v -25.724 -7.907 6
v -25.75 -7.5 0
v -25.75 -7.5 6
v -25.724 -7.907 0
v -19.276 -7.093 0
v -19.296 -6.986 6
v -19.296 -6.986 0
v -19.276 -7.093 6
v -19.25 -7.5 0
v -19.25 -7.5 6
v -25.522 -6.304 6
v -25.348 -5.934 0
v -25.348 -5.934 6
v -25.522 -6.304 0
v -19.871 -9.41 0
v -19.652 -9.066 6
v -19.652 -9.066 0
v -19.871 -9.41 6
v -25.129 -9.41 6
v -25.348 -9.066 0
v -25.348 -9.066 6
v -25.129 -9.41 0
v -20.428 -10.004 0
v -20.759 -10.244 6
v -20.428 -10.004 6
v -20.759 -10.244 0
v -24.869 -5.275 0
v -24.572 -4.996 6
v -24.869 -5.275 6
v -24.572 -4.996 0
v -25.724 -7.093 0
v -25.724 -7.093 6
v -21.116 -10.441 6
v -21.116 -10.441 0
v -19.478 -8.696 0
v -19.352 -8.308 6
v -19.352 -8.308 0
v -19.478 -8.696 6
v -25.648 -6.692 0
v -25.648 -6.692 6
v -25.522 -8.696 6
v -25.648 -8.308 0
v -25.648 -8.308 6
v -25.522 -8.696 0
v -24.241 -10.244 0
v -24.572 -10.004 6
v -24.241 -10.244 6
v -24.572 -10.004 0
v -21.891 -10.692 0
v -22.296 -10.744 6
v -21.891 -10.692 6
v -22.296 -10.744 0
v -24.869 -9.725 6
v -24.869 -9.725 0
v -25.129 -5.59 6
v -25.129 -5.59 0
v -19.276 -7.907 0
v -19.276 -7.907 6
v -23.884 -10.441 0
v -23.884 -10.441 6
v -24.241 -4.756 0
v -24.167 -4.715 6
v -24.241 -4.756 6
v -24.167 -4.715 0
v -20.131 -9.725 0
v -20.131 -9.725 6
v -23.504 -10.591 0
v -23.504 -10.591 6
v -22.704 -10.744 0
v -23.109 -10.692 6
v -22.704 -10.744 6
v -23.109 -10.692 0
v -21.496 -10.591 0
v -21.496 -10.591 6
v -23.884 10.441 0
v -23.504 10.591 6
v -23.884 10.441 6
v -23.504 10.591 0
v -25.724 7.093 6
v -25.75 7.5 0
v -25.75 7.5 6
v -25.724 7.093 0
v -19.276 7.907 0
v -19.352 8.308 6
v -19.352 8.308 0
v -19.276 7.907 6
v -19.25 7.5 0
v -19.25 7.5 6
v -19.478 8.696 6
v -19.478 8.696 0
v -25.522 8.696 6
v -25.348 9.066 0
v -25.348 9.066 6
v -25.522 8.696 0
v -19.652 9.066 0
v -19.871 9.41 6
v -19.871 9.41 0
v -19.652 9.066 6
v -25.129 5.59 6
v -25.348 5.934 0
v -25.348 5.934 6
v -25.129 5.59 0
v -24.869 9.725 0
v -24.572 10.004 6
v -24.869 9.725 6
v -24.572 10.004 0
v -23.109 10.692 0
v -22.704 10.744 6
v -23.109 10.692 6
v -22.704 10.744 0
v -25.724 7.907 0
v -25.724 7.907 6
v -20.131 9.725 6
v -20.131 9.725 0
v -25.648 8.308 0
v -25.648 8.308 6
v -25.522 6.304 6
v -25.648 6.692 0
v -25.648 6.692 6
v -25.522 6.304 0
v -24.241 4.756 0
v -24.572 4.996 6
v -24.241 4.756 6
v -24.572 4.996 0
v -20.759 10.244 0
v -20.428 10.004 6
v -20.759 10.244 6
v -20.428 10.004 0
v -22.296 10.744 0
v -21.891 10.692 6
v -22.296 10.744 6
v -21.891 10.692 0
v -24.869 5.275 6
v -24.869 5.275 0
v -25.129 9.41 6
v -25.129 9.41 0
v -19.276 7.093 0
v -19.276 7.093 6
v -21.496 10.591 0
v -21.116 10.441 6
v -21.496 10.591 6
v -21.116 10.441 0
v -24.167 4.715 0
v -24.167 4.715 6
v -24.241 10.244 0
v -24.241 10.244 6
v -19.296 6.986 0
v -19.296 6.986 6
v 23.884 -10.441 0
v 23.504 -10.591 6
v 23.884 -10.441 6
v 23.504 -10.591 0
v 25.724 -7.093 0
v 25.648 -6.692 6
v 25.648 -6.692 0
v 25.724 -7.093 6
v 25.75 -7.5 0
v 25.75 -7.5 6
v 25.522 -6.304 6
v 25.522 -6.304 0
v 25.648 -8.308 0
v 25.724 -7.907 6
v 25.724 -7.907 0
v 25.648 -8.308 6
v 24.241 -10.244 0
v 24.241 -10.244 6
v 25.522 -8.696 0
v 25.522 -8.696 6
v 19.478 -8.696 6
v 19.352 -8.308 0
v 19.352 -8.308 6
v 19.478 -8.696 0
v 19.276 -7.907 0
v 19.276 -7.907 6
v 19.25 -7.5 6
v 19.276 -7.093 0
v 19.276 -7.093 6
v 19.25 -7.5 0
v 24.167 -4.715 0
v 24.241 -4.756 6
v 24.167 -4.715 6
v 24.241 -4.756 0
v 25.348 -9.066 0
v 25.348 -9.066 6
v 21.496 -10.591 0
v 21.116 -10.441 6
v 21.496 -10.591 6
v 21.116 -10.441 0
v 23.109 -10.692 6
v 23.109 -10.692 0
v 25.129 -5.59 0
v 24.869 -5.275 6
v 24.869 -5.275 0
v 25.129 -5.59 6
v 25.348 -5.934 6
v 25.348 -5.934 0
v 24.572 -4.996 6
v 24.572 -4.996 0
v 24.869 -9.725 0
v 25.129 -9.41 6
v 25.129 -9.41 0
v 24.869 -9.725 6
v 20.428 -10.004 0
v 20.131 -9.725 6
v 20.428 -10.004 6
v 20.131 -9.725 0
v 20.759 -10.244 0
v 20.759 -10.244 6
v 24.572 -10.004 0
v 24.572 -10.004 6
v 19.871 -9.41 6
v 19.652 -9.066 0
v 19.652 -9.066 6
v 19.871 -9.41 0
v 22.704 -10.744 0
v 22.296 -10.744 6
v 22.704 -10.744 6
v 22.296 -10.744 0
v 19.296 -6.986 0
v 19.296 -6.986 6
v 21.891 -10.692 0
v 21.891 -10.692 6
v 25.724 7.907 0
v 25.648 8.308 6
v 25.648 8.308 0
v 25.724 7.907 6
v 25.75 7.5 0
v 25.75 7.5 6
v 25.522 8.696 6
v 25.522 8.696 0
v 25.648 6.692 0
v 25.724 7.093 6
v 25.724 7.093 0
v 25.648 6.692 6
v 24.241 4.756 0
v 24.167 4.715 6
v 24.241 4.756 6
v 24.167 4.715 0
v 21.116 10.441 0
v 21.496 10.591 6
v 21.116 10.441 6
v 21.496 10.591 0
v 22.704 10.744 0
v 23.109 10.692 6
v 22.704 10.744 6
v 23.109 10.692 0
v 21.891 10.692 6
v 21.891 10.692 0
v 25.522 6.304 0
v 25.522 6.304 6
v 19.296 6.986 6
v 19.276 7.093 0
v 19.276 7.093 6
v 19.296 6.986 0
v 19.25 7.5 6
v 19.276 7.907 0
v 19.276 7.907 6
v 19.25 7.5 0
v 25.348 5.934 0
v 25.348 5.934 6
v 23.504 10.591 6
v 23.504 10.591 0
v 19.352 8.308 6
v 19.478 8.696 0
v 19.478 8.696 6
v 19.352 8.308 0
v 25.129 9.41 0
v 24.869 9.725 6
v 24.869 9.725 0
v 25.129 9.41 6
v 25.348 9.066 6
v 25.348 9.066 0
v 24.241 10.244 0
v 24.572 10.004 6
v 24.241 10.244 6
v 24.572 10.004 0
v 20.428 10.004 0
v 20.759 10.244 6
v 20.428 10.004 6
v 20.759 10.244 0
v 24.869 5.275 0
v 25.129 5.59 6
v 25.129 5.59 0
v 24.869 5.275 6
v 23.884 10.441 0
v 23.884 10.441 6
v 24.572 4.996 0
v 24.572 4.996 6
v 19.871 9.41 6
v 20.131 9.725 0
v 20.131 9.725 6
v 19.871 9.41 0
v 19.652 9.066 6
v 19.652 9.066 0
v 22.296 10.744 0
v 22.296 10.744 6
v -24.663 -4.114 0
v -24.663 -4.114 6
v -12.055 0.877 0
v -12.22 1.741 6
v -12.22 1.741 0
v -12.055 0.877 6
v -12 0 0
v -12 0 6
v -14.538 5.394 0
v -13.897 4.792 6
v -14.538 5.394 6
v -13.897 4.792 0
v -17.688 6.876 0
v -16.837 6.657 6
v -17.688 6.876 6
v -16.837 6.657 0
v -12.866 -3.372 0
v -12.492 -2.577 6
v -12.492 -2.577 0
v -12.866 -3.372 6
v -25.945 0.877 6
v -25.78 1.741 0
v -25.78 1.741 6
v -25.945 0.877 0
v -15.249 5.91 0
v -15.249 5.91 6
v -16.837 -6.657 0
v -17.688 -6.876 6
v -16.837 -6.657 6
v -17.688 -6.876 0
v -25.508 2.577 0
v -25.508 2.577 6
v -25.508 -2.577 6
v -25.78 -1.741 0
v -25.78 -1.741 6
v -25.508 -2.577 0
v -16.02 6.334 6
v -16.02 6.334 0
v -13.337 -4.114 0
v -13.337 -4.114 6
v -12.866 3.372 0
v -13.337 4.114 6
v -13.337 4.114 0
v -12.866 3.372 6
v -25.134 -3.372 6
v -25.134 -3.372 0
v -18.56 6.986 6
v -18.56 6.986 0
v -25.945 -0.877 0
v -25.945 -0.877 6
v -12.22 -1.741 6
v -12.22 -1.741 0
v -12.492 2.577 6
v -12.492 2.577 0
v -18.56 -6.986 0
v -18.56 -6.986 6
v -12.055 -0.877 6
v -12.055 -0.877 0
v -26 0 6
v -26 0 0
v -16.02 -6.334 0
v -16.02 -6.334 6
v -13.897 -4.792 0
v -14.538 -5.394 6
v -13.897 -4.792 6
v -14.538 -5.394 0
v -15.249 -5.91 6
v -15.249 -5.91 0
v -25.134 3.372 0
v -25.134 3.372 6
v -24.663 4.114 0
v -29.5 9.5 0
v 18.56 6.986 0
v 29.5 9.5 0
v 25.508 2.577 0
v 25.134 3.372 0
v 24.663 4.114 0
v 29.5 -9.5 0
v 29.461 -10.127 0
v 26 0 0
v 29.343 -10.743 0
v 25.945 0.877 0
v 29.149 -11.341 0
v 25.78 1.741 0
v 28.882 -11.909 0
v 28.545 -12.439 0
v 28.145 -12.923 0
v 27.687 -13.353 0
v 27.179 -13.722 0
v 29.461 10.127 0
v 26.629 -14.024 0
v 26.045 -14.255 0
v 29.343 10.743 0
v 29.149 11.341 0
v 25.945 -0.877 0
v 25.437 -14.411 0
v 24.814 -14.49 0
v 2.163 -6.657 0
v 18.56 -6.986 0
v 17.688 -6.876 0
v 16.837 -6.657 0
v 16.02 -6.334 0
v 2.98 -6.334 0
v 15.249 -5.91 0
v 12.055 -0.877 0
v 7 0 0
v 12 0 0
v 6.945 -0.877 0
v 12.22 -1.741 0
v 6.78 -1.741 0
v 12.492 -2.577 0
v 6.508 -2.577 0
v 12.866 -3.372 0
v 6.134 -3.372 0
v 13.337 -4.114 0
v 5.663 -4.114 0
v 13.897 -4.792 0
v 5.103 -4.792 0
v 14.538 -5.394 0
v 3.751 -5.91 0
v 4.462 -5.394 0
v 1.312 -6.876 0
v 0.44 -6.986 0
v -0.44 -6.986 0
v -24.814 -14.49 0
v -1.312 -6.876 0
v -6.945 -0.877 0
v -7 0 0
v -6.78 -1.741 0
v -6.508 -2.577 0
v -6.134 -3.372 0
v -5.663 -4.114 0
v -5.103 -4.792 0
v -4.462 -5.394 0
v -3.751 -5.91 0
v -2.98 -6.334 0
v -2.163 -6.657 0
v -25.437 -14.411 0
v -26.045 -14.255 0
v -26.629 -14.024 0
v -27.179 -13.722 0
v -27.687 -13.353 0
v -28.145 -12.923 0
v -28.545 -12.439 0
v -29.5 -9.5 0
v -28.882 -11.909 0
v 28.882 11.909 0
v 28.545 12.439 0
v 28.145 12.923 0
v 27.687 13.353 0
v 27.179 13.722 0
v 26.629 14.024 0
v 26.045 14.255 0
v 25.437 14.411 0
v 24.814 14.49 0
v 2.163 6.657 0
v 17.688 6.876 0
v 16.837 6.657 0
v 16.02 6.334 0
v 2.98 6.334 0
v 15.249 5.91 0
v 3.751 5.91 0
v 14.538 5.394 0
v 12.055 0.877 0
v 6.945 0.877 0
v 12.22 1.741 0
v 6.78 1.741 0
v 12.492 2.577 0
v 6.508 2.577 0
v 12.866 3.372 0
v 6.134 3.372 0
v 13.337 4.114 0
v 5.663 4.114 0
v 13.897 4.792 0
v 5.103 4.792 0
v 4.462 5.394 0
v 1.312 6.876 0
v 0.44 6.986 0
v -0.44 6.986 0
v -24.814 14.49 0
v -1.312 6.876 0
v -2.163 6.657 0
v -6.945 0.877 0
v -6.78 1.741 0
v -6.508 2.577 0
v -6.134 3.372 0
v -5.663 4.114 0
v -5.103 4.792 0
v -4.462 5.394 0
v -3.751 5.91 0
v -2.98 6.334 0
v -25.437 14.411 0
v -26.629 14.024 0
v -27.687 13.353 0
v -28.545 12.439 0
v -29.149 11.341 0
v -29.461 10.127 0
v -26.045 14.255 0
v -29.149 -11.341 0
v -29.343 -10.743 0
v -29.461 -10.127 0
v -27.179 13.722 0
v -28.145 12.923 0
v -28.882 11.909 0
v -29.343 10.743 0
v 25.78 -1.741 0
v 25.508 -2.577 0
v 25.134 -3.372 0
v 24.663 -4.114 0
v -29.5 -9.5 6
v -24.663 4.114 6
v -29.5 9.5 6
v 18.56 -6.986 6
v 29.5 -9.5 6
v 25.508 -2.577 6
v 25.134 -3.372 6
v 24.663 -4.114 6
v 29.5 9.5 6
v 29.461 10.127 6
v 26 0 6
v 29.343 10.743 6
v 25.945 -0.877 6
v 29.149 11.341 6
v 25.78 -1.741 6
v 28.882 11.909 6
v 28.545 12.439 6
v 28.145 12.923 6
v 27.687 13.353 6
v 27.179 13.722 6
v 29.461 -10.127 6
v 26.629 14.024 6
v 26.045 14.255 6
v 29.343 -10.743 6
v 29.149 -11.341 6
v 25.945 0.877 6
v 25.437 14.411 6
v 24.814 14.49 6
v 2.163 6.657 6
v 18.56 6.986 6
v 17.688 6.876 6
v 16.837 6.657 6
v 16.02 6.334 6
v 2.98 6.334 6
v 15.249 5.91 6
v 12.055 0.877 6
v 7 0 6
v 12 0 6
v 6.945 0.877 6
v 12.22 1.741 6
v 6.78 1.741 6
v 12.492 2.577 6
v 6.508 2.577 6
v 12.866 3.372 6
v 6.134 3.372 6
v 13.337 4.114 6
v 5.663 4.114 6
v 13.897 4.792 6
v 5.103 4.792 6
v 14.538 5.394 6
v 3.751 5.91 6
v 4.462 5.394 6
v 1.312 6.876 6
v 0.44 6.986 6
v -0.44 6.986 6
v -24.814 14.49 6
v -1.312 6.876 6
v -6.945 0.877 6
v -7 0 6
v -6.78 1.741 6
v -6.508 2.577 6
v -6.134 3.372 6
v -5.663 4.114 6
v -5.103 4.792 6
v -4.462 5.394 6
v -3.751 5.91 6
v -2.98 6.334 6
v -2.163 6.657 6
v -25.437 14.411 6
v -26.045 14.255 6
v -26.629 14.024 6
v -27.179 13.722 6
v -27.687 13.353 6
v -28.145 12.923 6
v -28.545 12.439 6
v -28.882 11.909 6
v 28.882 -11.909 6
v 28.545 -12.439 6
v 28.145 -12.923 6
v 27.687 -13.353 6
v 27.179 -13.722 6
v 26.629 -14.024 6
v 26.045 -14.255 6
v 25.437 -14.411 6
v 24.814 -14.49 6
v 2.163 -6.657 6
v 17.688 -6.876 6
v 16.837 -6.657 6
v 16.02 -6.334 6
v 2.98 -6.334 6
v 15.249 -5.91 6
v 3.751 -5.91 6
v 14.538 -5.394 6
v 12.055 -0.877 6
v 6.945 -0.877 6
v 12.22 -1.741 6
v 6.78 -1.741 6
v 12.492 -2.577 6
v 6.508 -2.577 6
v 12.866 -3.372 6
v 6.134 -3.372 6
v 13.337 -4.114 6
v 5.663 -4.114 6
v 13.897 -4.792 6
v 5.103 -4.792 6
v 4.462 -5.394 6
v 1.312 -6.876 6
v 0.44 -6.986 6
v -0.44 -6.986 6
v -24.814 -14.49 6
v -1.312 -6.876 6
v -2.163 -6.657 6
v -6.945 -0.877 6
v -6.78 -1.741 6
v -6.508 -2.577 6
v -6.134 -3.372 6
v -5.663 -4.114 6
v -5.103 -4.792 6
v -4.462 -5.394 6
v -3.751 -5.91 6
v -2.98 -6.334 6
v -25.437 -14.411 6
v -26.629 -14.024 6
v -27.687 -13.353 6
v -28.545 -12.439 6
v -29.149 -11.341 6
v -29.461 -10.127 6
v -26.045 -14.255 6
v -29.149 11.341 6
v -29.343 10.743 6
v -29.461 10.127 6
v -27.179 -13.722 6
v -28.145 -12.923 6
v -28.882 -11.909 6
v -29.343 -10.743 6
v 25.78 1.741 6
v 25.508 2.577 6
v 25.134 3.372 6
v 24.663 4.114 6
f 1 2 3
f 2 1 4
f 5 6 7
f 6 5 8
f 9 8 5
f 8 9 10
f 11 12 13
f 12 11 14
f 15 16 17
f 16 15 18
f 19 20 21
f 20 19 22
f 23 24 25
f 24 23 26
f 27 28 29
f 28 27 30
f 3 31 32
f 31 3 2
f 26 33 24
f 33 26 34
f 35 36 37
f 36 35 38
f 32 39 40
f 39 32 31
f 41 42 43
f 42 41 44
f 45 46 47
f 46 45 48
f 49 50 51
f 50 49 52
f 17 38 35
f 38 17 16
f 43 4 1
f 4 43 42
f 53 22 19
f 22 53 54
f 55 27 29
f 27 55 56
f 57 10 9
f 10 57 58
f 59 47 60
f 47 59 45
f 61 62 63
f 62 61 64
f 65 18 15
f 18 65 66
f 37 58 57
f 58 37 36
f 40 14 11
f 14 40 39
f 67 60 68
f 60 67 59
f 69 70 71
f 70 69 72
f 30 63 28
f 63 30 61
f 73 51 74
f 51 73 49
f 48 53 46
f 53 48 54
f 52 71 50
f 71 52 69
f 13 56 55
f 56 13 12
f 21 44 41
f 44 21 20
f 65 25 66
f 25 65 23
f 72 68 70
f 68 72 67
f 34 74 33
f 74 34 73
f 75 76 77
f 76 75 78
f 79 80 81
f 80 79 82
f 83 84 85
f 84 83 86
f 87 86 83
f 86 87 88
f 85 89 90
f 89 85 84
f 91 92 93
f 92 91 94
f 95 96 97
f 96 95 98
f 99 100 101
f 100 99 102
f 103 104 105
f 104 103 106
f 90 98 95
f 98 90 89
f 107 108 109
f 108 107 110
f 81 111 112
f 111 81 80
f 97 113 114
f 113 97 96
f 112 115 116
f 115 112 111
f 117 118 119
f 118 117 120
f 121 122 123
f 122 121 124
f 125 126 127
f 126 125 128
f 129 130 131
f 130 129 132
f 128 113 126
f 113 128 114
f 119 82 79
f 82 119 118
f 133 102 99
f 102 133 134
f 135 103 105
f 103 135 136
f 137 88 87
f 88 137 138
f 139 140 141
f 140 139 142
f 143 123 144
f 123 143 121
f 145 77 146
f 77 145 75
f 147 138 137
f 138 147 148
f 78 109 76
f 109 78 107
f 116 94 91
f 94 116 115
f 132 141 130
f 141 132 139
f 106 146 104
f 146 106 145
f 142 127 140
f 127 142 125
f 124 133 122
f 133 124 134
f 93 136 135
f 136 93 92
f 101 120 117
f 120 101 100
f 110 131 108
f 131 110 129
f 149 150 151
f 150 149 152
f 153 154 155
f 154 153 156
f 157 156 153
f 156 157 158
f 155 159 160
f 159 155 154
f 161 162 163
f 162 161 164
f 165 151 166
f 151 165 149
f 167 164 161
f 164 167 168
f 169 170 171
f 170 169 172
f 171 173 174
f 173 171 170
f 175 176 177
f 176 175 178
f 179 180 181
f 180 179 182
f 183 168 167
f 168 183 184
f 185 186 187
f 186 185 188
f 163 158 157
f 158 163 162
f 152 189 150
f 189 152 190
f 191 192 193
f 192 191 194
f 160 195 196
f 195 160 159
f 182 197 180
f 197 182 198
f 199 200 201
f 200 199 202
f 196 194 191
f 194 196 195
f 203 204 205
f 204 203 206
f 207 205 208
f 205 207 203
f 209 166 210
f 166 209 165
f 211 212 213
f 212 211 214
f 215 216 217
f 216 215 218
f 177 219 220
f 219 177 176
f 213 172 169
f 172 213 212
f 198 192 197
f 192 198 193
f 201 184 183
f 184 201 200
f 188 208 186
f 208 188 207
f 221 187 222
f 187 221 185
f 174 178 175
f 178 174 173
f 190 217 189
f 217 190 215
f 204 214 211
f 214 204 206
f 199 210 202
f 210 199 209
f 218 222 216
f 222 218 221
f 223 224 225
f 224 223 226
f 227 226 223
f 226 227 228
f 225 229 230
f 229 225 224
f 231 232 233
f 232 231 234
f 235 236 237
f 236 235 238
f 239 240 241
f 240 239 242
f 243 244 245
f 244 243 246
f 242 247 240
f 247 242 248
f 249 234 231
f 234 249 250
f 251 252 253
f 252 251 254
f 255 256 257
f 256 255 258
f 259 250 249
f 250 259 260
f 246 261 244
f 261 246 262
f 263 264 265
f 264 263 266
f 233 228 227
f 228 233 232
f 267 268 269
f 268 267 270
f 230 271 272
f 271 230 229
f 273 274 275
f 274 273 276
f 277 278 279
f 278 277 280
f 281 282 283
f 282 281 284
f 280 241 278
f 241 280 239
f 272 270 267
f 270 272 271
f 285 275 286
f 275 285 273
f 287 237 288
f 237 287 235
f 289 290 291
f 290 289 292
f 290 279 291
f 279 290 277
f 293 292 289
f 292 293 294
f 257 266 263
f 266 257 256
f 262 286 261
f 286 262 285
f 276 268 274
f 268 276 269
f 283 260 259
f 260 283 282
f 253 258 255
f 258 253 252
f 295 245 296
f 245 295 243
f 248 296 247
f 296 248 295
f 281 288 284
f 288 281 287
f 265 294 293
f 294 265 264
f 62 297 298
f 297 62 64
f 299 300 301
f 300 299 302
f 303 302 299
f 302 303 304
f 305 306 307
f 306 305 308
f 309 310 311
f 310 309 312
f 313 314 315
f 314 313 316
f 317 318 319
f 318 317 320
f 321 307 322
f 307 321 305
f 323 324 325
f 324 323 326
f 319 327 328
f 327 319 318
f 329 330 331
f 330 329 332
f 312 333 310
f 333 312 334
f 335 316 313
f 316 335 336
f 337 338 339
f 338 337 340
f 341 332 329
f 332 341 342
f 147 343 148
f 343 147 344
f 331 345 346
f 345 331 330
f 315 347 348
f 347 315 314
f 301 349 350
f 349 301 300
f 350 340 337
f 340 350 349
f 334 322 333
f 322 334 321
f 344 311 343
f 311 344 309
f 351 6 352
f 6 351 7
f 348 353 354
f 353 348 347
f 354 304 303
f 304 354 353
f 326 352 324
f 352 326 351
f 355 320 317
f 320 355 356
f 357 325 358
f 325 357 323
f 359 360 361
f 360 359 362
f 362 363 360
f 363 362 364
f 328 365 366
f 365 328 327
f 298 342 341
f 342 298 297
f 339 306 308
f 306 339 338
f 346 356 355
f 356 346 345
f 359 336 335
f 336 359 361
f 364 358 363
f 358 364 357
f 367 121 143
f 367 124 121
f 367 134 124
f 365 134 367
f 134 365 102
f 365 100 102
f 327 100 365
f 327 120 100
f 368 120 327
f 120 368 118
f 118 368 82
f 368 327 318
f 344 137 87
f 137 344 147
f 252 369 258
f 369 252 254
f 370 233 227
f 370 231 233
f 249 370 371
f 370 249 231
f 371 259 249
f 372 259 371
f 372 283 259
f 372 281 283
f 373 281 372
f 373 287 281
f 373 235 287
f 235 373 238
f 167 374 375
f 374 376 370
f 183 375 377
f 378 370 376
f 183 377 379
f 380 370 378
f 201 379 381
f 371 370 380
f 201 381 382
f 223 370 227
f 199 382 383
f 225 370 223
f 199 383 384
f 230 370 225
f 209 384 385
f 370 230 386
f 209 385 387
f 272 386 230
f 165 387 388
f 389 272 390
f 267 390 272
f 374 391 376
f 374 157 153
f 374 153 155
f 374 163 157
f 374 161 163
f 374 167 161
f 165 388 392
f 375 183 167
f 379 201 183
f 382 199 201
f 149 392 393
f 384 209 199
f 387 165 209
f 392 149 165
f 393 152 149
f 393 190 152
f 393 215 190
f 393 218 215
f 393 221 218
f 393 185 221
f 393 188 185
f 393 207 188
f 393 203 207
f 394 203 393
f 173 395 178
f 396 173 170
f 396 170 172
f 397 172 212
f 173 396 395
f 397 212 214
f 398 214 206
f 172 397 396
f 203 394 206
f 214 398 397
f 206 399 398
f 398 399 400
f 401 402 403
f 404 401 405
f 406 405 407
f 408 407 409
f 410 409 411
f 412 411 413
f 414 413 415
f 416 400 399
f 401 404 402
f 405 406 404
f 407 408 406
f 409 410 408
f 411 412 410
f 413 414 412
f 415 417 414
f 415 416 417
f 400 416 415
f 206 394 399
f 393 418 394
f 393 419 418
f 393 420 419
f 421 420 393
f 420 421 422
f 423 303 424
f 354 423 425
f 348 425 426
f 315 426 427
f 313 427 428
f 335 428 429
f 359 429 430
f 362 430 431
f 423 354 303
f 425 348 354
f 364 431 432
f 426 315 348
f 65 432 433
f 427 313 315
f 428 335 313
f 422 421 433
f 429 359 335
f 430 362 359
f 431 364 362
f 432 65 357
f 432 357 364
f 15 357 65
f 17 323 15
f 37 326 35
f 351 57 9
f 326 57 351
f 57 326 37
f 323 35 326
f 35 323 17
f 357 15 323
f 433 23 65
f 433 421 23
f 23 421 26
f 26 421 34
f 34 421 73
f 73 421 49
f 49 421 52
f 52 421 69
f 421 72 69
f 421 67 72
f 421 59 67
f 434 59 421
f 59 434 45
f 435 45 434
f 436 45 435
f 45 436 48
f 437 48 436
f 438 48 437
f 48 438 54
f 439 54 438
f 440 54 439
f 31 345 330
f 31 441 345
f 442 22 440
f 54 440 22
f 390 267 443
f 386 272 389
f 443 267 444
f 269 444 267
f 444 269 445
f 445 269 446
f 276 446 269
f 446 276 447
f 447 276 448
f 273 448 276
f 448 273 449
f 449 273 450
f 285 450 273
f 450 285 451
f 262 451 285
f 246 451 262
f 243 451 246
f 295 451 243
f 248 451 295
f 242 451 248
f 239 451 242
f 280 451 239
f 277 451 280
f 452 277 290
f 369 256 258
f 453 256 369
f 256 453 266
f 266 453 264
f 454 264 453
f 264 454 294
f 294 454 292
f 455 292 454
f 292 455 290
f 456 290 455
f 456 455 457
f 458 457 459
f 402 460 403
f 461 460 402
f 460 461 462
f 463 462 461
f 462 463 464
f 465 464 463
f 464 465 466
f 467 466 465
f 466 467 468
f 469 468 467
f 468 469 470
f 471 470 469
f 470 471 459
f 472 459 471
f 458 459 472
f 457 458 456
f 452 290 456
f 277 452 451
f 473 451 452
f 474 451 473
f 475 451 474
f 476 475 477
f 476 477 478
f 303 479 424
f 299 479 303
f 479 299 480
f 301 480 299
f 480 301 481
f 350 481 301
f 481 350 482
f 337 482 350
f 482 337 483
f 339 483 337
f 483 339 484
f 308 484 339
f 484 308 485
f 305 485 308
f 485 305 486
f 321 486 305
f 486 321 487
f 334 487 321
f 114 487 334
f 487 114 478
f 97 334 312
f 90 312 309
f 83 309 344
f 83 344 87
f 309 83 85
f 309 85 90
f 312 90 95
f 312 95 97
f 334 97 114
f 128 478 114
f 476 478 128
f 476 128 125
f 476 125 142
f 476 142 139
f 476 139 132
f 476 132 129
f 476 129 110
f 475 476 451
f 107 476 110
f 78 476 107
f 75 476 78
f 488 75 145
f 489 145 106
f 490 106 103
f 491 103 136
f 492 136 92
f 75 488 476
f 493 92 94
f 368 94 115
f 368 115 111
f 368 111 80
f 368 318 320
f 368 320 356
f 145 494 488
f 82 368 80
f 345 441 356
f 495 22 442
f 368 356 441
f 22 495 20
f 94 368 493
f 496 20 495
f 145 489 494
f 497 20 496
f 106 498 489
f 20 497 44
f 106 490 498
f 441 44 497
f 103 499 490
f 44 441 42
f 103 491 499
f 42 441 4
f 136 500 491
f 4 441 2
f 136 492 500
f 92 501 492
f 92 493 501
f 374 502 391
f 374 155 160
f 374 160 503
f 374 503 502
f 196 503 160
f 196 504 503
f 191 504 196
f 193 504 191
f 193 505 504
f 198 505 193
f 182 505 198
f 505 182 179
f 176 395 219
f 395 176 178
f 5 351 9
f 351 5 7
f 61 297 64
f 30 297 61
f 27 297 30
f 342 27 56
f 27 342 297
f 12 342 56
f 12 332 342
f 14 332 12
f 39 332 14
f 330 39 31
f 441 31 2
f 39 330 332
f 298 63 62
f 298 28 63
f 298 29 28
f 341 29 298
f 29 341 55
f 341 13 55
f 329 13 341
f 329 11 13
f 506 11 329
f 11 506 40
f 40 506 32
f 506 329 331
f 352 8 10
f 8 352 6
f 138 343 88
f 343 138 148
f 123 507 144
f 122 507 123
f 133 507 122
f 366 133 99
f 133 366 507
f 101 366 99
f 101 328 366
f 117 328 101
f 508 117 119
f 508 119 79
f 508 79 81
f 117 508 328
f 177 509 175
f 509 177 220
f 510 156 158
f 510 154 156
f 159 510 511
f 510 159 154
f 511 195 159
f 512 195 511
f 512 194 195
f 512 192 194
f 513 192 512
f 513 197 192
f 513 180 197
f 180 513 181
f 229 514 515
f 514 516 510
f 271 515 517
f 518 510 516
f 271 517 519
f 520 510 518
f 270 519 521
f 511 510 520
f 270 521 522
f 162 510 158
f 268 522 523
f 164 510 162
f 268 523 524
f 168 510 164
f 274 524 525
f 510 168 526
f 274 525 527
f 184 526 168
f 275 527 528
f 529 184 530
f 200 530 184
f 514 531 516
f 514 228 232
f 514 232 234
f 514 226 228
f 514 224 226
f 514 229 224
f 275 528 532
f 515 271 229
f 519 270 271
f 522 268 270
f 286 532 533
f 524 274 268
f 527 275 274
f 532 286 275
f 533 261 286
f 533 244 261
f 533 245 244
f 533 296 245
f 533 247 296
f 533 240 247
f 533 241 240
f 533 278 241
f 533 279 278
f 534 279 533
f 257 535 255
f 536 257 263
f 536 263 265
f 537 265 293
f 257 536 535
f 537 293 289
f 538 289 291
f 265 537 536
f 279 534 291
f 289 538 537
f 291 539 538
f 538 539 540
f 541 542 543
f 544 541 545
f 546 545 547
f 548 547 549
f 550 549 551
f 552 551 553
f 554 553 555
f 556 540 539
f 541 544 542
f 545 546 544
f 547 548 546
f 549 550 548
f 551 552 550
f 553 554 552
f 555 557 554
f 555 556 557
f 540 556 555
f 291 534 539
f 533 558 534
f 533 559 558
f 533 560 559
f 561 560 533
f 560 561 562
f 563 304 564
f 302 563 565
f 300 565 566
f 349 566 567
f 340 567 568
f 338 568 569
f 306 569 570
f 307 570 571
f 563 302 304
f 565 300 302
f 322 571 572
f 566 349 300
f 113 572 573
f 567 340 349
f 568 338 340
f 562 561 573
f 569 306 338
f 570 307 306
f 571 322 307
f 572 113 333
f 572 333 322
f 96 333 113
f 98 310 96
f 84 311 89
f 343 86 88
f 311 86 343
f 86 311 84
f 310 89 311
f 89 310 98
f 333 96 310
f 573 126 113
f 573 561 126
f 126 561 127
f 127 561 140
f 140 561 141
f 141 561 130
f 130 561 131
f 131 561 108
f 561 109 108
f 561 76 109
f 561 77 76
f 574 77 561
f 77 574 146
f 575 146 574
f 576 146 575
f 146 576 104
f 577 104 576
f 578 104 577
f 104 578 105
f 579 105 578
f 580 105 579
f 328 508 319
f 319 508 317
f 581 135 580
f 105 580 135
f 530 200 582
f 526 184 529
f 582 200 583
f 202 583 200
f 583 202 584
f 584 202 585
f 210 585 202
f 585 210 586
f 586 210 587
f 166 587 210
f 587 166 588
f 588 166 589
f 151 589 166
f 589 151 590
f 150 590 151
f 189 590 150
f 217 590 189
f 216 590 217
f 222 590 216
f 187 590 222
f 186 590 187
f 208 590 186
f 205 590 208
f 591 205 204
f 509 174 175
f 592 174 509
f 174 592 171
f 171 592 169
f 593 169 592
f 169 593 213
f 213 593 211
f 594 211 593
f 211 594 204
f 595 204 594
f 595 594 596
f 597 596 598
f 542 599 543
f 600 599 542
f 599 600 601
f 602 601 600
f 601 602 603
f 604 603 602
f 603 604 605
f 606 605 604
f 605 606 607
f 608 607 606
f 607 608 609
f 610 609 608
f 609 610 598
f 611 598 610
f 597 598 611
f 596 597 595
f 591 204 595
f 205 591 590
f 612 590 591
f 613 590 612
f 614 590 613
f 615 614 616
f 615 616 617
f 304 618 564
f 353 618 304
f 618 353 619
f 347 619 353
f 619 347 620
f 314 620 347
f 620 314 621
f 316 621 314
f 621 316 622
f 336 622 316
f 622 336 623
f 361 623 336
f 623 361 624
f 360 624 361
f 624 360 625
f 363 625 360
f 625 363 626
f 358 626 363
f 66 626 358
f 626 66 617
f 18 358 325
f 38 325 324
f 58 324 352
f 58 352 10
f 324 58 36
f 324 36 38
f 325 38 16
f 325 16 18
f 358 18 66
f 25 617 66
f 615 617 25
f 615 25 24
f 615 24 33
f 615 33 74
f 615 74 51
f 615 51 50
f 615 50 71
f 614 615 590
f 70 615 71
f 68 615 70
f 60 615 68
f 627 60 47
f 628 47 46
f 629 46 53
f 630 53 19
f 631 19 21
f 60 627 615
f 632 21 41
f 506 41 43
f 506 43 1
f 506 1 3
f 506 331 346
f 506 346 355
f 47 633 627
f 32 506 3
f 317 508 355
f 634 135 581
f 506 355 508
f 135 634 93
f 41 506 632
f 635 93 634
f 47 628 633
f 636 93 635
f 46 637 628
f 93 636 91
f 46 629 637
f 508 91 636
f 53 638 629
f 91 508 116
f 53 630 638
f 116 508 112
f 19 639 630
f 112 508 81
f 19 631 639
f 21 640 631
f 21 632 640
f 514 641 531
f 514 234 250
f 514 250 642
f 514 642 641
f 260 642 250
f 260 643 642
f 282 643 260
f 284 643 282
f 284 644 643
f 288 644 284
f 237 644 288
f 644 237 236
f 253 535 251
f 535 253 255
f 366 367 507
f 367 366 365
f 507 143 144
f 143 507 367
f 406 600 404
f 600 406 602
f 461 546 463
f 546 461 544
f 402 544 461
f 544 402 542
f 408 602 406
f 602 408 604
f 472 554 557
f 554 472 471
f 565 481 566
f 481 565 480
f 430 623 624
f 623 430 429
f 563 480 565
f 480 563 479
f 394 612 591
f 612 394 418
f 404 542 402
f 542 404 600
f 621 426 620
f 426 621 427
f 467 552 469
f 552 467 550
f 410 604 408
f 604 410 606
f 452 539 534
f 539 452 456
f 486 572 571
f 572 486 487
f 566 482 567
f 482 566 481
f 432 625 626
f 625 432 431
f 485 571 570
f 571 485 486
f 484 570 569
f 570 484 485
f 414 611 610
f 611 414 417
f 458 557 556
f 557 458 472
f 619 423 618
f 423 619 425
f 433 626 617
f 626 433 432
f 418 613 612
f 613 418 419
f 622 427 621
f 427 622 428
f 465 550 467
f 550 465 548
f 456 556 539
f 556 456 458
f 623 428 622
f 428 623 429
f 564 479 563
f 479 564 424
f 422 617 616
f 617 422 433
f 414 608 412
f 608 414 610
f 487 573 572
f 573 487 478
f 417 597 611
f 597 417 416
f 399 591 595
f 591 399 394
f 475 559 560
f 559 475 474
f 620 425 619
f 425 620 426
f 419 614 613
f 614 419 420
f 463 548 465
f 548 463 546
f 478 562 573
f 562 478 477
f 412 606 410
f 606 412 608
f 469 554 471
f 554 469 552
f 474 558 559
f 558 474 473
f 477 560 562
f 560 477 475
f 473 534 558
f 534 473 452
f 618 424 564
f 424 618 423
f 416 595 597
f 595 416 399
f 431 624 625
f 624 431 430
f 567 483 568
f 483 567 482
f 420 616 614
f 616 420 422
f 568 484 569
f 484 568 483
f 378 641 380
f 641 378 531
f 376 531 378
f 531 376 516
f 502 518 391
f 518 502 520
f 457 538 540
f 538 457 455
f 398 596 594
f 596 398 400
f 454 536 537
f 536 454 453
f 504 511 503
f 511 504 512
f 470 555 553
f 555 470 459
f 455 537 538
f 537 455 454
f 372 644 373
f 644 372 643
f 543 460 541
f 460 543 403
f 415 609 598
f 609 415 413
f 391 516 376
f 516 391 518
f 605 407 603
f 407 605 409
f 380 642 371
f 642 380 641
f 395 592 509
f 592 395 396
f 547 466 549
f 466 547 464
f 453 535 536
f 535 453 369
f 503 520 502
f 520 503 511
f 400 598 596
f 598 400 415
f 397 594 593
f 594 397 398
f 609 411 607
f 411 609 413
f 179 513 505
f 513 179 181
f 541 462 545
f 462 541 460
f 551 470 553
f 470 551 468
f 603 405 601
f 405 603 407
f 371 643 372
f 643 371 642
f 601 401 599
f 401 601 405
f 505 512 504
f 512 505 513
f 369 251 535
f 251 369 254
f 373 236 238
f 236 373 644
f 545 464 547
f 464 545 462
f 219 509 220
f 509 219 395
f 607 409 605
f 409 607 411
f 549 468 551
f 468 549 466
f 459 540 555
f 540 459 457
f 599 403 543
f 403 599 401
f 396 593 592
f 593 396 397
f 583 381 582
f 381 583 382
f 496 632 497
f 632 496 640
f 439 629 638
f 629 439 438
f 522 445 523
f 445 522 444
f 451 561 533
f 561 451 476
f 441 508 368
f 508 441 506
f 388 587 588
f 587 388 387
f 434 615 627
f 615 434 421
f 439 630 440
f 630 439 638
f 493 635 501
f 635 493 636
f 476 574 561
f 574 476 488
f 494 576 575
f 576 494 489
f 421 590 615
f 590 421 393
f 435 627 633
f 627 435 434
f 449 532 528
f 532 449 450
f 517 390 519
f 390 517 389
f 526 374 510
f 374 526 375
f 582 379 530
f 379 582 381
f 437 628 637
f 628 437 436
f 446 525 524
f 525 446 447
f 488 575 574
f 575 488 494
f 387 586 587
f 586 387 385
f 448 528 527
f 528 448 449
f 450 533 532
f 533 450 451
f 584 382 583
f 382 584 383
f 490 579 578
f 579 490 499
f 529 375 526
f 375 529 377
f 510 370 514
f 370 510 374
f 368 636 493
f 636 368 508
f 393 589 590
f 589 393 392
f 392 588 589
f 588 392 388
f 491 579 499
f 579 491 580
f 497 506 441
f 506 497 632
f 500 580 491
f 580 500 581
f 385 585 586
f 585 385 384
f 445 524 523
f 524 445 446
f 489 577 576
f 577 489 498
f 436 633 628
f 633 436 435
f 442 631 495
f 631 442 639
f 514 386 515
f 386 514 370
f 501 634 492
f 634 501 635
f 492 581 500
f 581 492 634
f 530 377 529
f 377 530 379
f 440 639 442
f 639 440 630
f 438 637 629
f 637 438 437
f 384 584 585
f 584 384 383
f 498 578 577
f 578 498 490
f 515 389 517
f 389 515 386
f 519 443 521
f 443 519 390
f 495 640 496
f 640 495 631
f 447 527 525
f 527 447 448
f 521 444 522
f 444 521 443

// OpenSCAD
$fn = 50;


difference() {
	union() {
		hull() {
			translate(v = [-24.5000000000, 9.5000000000, 0]) {
				cylinder(h = 6, r = 5);
			}
			translate(v = [24.5000000000, 9.5000000000, 0]) {
				cylinder(h = 6, r = 5);
			}
			translate(v = [-24.5000000000, -9.5000000000, 0]) {
				cylinder(h = 6, r = 5);
			}
			translate(v = [24.5000000000, -9.5000000000, 0]) {
				cylinder(h = 6, r = 5);
			}
		}
	}
	union() {
		#translate(v = [-22.5000000000, -7.5000000000, -100.0000000000]) {
			cylinder(h = 200, r = 3.2500000000);
		}
		#translate(v = [-22.5000000000, 7.5000000000, -100.0000000000]) {
			cylinder(h = 200, r = 3.2500000000);
		}
		#translate(v = [22.5000000000, -7.5000000000, -100.0000000000]) {
			cylinder(h = 200, r = 3.2500000000);
		}
		#translate(v = [22.5000000000, 7.5000000000, -100.0000000000]) {
			cylinder(h = 200, r = 3.2500000000);
		}
		#translate(v = [-19.0000000000, 0, 0]) {
			cylinder(h = 6, r = 7.0000000000);
		}
		#cylinder(h = 6, r = 7.0000000000);
		#translate(v = [19.0000000000, 0, 0]) {
			cylinder(h = 6, r = 7.0000000000);
		}
	}
}
